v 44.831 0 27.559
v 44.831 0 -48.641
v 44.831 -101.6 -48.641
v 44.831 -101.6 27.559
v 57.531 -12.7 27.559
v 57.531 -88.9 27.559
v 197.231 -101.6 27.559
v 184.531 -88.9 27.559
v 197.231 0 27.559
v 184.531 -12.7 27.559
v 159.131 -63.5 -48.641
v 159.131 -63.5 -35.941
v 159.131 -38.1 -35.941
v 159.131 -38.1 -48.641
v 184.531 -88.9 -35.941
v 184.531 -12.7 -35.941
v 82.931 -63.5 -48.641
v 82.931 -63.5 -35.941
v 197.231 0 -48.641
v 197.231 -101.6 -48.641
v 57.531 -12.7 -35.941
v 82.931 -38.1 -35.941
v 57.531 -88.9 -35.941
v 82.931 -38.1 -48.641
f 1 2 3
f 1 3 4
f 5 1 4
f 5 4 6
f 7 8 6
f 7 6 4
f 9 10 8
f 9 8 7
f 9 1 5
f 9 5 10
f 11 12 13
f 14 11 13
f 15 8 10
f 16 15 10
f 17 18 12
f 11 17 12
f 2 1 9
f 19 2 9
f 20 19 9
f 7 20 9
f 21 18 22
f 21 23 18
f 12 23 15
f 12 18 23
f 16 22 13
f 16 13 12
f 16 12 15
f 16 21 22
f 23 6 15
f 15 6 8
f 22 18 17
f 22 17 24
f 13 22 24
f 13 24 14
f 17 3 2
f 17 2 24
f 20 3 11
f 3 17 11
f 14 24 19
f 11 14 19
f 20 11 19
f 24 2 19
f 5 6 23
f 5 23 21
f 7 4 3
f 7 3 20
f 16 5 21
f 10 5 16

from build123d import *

# Parameters (mm, degrees)
F0_W     = 152.4
F0_H     = 76.2
F1_DEPTH = 101.6
F2_W     = 127
F2_H     = 76.2
F3_DEPTH = 63.5
F4_W     = 76.2
F4_H     = 25.4
F5_DEPTH = 12.7


with BuildPart() as f1:
    # F0 (on Front) → F1 (new body)
    with BuildSketch(Plane.XZ):
        with Locations((121.03101, -10.541003)):
            Rectangle(F0_W, F0_H)
    extrude(amount=F1_DEPTH)

    # F2 (on face) → F3 (cut)
    with BuildSketch(Plane.XY.offset(27.558997)):
        with Locations((121.03101, -50.8)):
            Rectangle(F2_W, F2_H)
    extrude(amount=-F3_DEPTH, mode=Mode.SUBTRACT)

    # F4 (on face) → F5 (cut)
    with BuildSketch(Plane.XY.offset(-35.941003)):
        with Locations((121.03101, -50.8)):
            Rectangle(F4_W, F4_H)
    extrude(amount=-F5_DEPTH, mode=Mode.SUBTRACT)


solid = f1.part
